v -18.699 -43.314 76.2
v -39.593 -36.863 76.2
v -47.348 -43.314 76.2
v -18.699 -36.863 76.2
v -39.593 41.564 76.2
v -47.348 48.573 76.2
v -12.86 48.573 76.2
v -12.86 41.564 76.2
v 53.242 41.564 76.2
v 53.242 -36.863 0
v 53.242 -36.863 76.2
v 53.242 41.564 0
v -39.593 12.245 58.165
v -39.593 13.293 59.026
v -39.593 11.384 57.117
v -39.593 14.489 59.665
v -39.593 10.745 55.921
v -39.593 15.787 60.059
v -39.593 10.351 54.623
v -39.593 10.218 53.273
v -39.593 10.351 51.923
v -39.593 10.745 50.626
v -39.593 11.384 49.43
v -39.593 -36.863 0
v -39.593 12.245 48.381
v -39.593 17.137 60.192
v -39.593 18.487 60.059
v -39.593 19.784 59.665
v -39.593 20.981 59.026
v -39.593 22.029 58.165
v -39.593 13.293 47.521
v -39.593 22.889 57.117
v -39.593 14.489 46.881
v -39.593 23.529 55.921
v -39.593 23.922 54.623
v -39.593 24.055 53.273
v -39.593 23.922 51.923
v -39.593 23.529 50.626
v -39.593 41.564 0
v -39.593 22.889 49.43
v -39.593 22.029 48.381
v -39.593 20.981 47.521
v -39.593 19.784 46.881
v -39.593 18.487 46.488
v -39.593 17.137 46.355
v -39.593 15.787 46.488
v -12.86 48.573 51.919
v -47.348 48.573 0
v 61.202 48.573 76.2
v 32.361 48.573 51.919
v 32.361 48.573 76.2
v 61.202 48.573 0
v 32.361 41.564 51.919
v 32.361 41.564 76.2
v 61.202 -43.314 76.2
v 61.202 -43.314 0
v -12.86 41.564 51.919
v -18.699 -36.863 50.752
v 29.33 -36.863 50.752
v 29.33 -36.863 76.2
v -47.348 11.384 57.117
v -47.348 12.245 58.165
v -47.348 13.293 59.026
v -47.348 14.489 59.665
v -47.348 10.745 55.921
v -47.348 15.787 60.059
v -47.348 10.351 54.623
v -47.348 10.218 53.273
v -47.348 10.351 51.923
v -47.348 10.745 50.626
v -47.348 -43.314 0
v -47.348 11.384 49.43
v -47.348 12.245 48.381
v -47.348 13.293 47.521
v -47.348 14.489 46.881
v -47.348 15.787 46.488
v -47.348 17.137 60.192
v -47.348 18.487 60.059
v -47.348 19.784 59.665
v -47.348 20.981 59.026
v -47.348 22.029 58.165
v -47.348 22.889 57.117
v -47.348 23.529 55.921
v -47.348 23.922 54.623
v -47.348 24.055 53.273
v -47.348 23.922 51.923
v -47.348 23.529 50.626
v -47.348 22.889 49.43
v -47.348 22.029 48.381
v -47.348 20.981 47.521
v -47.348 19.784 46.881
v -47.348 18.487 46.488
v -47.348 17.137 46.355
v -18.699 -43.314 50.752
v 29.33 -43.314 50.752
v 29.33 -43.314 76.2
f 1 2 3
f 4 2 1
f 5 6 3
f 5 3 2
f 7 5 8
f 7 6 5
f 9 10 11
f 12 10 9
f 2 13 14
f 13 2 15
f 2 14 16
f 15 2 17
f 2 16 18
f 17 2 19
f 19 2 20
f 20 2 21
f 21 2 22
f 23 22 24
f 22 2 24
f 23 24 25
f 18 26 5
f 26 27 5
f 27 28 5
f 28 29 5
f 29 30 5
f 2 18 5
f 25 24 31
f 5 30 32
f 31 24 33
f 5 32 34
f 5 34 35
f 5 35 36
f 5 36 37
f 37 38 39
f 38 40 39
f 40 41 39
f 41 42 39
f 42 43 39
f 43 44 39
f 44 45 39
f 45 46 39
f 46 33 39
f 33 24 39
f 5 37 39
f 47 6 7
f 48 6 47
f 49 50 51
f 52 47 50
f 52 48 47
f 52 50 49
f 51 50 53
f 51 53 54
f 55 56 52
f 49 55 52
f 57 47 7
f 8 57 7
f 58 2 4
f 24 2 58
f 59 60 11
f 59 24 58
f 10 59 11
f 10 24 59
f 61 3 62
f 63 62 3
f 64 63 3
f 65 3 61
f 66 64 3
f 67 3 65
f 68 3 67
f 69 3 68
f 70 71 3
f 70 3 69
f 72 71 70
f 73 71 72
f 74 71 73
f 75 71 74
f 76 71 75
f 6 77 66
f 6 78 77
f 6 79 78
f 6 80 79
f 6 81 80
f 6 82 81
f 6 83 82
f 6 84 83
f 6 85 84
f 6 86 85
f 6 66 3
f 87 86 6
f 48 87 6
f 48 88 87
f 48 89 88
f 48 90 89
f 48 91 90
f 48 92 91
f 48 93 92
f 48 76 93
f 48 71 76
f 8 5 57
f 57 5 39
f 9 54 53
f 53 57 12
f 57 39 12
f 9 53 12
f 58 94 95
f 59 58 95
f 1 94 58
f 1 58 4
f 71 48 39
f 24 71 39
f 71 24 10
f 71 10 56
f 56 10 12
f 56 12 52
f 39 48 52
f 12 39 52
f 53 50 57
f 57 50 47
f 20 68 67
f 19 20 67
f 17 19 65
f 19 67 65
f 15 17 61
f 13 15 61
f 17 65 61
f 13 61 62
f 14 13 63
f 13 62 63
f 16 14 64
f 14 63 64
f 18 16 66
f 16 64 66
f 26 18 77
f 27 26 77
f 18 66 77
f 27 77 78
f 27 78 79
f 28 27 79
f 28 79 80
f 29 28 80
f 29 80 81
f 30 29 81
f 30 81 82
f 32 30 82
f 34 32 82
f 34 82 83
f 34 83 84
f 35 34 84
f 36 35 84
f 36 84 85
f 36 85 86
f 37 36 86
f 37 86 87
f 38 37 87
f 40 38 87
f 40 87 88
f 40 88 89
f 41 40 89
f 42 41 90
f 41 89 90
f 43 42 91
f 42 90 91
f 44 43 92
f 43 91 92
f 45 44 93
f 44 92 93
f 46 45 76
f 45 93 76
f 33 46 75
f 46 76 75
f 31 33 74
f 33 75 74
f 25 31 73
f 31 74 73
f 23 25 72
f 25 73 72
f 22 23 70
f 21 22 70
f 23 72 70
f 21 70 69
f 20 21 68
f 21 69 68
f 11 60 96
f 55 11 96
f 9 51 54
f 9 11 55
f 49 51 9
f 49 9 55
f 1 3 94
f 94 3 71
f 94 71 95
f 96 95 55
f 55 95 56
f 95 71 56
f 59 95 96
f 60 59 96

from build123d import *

# Parameters (mm, degrees)
F0_W      = 108.549212
F0_H      = 91.886736
F1_DEPTH  = 76.2
F2_W      = 92.835255
F2_H      = 78.426812
F3_DEPTH  = 82.55
F5_R      = 6.91847
F6_DEPTH  = 25.4
F7_W      = 48.028812
F7_H      = 25.447967
F8_DEPTH  = 25.4
F9_W      = 45.221382
F9_H      = 24.2807
F10_DEPTH = 25.4


with BuildPart() as f1:
    # F0 (on Top) → F1 (new body)
    with BuildSketch(Plane.XY):
        with Locations((6.926911, 2.629757)):
            Rectangle(F0_W, F0_H)
    extrude(amount=F1_DEPTH)

    # F2 (on Top) → F3 (cut)
    with BuildSketch(Plane.XY):
        with Locations((6.824679, 2.350463)):
            Rectangle(F2_W, F2_H)
    extrude(amount=F3_DEPTH, mode=Mode.SUBTRACT)

    # F5 (on face) → F6 (cut)
    with BuildSketch(Plane(origin=(-47.347695, 0, 0), x_dir=(0, -1, 0), z_dir=(-1, 0, 0))):
        with Locations((-17.136907, 53.27322)):
            Circle(F5_R)
    extrude(amount=-F6_DEPTH, mode=Mode.SUBTRACT)

    # F7 (on face) → F8 (cut)
    with BuildSketch(Plane.XZ.offset(43.313611)):
        with Locations((5.315581, 63.476017)):
            Rectangle(F7_W, F7_H)
    extrude(amount=-F8_DEPTH, mode=Mode.SUBTRACT)

    # F9 (on face) → F10 (cut)
    with BuildSketch(Plane(origin=(0, 48.573125, 0), x_dir=(-1, 0, 0), z_dir=(0, 1, 0))):
        with Locations((-9.750217, 64.05965)):
            Rectangle(F9_W, F9_H)
    extrude(amount=-F10_DEPTH, mode=Mode.SUBTRACT)


solid = f1.part
